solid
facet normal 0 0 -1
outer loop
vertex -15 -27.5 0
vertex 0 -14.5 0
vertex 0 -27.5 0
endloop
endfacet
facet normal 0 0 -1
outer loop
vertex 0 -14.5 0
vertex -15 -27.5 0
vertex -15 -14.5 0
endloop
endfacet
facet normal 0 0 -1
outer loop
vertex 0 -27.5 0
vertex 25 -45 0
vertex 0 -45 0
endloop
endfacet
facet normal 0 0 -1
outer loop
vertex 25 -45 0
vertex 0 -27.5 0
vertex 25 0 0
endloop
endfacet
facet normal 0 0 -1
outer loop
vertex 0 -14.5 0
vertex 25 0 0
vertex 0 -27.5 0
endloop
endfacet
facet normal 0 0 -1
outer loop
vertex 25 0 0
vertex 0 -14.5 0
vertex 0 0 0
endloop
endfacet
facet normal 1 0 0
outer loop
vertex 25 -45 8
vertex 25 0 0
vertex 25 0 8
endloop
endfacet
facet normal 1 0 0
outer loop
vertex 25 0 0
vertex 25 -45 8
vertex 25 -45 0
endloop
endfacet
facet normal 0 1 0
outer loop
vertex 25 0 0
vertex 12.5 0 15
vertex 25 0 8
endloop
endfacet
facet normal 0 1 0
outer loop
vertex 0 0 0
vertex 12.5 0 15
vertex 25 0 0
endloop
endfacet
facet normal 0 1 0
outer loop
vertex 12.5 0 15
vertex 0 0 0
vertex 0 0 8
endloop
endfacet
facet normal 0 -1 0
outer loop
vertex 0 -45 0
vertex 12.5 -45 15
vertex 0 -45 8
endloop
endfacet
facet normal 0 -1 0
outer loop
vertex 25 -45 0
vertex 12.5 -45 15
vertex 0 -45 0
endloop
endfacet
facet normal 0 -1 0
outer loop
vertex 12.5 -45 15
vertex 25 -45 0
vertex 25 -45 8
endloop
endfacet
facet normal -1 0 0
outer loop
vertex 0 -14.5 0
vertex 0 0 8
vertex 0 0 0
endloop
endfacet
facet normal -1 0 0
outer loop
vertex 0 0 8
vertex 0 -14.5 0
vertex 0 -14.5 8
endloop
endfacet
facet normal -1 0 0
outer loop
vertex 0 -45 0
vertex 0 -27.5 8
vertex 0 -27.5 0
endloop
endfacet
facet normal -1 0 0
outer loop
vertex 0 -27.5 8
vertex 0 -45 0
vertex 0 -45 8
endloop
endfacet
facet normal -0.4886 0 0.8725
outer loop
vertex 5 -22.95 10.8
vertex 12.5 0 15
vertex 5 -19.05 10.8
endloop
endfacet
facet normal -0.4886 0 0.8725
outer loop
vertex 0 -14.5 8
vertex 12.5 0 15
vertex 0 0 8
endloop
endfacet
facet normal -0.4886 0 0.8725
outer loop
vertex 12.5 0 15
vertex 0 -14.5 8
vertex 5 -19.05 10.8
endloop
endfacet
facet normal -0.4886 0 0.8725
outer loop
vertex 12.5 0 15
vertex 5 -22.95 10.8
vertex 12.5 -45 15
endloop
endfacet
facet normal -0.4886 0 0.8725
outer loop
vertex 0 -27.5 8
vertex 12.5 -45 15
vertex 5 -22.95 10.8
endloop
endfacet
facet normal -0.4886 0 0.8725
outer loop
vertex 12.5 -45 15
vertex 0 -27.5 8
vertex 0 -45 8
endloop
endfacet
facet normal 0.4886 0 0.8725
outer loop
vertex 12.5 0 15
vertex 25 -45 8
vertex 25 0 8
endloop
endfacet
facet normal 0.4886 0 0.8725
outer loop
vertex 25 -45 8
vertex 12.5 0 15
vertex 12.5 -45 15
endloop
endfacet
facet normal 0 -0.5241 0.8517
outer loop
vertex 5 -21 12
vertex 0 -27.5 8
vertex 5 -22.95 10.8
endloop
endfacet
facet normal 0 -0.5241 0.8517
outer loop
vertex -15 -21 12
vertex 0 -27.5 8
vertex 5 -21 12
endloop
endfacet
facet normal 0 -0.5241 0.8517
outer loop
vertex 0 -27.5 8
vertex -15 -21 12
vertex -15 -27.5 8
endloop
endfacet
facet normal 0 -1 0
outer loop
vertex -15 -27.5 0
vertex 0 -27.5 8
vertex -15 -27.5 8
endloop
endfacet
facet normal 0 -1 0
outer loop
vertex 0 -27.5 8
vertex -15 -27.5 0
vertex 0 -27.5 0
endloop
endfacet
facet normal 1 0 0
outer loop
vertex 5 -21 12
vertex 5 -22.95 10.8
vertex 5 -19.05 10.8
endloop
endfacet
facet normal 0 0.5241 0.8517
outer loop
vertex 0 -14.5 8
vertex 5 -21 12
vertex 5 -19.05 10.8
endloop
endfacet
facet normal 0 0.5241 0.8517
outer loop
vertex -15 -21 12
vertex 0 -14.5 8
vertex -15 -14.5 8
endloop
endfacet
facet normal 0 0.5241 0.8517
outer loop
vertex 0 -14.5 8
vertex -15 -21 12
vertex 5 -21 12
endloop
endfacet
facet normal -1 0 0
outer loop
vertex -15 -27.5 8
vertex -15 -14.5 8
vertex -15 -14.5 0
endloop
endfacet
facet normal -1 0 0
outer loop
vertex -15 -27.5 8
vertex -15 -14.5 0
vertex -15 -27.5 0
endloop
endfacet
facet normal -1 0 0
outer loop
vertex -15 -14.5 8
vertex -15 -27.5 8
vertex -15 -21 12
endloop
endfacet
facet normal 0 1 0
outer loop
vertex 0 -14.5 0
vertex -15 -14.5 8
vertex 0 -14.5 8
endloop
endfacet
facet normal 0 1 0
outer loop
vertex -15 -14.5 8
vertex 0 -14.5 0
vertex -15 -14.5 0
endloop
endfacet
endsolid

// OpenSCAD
module house_profile(l=45,w=25,wall_height=8,apex_width=25/2,apex_height=15){
rotate([90,0,0])
linear_extrude(l)
polygon(points=[[0,0],[w,0],[w,wall_height],[apex_width,apex_height],[0,wall_height]]);
}

house_profile();

color("blue")translate([-15,-55/2,0])rotate([0,0,90])house_profile(l=20,w=13,apex_width=13/2,apex_height=12);
